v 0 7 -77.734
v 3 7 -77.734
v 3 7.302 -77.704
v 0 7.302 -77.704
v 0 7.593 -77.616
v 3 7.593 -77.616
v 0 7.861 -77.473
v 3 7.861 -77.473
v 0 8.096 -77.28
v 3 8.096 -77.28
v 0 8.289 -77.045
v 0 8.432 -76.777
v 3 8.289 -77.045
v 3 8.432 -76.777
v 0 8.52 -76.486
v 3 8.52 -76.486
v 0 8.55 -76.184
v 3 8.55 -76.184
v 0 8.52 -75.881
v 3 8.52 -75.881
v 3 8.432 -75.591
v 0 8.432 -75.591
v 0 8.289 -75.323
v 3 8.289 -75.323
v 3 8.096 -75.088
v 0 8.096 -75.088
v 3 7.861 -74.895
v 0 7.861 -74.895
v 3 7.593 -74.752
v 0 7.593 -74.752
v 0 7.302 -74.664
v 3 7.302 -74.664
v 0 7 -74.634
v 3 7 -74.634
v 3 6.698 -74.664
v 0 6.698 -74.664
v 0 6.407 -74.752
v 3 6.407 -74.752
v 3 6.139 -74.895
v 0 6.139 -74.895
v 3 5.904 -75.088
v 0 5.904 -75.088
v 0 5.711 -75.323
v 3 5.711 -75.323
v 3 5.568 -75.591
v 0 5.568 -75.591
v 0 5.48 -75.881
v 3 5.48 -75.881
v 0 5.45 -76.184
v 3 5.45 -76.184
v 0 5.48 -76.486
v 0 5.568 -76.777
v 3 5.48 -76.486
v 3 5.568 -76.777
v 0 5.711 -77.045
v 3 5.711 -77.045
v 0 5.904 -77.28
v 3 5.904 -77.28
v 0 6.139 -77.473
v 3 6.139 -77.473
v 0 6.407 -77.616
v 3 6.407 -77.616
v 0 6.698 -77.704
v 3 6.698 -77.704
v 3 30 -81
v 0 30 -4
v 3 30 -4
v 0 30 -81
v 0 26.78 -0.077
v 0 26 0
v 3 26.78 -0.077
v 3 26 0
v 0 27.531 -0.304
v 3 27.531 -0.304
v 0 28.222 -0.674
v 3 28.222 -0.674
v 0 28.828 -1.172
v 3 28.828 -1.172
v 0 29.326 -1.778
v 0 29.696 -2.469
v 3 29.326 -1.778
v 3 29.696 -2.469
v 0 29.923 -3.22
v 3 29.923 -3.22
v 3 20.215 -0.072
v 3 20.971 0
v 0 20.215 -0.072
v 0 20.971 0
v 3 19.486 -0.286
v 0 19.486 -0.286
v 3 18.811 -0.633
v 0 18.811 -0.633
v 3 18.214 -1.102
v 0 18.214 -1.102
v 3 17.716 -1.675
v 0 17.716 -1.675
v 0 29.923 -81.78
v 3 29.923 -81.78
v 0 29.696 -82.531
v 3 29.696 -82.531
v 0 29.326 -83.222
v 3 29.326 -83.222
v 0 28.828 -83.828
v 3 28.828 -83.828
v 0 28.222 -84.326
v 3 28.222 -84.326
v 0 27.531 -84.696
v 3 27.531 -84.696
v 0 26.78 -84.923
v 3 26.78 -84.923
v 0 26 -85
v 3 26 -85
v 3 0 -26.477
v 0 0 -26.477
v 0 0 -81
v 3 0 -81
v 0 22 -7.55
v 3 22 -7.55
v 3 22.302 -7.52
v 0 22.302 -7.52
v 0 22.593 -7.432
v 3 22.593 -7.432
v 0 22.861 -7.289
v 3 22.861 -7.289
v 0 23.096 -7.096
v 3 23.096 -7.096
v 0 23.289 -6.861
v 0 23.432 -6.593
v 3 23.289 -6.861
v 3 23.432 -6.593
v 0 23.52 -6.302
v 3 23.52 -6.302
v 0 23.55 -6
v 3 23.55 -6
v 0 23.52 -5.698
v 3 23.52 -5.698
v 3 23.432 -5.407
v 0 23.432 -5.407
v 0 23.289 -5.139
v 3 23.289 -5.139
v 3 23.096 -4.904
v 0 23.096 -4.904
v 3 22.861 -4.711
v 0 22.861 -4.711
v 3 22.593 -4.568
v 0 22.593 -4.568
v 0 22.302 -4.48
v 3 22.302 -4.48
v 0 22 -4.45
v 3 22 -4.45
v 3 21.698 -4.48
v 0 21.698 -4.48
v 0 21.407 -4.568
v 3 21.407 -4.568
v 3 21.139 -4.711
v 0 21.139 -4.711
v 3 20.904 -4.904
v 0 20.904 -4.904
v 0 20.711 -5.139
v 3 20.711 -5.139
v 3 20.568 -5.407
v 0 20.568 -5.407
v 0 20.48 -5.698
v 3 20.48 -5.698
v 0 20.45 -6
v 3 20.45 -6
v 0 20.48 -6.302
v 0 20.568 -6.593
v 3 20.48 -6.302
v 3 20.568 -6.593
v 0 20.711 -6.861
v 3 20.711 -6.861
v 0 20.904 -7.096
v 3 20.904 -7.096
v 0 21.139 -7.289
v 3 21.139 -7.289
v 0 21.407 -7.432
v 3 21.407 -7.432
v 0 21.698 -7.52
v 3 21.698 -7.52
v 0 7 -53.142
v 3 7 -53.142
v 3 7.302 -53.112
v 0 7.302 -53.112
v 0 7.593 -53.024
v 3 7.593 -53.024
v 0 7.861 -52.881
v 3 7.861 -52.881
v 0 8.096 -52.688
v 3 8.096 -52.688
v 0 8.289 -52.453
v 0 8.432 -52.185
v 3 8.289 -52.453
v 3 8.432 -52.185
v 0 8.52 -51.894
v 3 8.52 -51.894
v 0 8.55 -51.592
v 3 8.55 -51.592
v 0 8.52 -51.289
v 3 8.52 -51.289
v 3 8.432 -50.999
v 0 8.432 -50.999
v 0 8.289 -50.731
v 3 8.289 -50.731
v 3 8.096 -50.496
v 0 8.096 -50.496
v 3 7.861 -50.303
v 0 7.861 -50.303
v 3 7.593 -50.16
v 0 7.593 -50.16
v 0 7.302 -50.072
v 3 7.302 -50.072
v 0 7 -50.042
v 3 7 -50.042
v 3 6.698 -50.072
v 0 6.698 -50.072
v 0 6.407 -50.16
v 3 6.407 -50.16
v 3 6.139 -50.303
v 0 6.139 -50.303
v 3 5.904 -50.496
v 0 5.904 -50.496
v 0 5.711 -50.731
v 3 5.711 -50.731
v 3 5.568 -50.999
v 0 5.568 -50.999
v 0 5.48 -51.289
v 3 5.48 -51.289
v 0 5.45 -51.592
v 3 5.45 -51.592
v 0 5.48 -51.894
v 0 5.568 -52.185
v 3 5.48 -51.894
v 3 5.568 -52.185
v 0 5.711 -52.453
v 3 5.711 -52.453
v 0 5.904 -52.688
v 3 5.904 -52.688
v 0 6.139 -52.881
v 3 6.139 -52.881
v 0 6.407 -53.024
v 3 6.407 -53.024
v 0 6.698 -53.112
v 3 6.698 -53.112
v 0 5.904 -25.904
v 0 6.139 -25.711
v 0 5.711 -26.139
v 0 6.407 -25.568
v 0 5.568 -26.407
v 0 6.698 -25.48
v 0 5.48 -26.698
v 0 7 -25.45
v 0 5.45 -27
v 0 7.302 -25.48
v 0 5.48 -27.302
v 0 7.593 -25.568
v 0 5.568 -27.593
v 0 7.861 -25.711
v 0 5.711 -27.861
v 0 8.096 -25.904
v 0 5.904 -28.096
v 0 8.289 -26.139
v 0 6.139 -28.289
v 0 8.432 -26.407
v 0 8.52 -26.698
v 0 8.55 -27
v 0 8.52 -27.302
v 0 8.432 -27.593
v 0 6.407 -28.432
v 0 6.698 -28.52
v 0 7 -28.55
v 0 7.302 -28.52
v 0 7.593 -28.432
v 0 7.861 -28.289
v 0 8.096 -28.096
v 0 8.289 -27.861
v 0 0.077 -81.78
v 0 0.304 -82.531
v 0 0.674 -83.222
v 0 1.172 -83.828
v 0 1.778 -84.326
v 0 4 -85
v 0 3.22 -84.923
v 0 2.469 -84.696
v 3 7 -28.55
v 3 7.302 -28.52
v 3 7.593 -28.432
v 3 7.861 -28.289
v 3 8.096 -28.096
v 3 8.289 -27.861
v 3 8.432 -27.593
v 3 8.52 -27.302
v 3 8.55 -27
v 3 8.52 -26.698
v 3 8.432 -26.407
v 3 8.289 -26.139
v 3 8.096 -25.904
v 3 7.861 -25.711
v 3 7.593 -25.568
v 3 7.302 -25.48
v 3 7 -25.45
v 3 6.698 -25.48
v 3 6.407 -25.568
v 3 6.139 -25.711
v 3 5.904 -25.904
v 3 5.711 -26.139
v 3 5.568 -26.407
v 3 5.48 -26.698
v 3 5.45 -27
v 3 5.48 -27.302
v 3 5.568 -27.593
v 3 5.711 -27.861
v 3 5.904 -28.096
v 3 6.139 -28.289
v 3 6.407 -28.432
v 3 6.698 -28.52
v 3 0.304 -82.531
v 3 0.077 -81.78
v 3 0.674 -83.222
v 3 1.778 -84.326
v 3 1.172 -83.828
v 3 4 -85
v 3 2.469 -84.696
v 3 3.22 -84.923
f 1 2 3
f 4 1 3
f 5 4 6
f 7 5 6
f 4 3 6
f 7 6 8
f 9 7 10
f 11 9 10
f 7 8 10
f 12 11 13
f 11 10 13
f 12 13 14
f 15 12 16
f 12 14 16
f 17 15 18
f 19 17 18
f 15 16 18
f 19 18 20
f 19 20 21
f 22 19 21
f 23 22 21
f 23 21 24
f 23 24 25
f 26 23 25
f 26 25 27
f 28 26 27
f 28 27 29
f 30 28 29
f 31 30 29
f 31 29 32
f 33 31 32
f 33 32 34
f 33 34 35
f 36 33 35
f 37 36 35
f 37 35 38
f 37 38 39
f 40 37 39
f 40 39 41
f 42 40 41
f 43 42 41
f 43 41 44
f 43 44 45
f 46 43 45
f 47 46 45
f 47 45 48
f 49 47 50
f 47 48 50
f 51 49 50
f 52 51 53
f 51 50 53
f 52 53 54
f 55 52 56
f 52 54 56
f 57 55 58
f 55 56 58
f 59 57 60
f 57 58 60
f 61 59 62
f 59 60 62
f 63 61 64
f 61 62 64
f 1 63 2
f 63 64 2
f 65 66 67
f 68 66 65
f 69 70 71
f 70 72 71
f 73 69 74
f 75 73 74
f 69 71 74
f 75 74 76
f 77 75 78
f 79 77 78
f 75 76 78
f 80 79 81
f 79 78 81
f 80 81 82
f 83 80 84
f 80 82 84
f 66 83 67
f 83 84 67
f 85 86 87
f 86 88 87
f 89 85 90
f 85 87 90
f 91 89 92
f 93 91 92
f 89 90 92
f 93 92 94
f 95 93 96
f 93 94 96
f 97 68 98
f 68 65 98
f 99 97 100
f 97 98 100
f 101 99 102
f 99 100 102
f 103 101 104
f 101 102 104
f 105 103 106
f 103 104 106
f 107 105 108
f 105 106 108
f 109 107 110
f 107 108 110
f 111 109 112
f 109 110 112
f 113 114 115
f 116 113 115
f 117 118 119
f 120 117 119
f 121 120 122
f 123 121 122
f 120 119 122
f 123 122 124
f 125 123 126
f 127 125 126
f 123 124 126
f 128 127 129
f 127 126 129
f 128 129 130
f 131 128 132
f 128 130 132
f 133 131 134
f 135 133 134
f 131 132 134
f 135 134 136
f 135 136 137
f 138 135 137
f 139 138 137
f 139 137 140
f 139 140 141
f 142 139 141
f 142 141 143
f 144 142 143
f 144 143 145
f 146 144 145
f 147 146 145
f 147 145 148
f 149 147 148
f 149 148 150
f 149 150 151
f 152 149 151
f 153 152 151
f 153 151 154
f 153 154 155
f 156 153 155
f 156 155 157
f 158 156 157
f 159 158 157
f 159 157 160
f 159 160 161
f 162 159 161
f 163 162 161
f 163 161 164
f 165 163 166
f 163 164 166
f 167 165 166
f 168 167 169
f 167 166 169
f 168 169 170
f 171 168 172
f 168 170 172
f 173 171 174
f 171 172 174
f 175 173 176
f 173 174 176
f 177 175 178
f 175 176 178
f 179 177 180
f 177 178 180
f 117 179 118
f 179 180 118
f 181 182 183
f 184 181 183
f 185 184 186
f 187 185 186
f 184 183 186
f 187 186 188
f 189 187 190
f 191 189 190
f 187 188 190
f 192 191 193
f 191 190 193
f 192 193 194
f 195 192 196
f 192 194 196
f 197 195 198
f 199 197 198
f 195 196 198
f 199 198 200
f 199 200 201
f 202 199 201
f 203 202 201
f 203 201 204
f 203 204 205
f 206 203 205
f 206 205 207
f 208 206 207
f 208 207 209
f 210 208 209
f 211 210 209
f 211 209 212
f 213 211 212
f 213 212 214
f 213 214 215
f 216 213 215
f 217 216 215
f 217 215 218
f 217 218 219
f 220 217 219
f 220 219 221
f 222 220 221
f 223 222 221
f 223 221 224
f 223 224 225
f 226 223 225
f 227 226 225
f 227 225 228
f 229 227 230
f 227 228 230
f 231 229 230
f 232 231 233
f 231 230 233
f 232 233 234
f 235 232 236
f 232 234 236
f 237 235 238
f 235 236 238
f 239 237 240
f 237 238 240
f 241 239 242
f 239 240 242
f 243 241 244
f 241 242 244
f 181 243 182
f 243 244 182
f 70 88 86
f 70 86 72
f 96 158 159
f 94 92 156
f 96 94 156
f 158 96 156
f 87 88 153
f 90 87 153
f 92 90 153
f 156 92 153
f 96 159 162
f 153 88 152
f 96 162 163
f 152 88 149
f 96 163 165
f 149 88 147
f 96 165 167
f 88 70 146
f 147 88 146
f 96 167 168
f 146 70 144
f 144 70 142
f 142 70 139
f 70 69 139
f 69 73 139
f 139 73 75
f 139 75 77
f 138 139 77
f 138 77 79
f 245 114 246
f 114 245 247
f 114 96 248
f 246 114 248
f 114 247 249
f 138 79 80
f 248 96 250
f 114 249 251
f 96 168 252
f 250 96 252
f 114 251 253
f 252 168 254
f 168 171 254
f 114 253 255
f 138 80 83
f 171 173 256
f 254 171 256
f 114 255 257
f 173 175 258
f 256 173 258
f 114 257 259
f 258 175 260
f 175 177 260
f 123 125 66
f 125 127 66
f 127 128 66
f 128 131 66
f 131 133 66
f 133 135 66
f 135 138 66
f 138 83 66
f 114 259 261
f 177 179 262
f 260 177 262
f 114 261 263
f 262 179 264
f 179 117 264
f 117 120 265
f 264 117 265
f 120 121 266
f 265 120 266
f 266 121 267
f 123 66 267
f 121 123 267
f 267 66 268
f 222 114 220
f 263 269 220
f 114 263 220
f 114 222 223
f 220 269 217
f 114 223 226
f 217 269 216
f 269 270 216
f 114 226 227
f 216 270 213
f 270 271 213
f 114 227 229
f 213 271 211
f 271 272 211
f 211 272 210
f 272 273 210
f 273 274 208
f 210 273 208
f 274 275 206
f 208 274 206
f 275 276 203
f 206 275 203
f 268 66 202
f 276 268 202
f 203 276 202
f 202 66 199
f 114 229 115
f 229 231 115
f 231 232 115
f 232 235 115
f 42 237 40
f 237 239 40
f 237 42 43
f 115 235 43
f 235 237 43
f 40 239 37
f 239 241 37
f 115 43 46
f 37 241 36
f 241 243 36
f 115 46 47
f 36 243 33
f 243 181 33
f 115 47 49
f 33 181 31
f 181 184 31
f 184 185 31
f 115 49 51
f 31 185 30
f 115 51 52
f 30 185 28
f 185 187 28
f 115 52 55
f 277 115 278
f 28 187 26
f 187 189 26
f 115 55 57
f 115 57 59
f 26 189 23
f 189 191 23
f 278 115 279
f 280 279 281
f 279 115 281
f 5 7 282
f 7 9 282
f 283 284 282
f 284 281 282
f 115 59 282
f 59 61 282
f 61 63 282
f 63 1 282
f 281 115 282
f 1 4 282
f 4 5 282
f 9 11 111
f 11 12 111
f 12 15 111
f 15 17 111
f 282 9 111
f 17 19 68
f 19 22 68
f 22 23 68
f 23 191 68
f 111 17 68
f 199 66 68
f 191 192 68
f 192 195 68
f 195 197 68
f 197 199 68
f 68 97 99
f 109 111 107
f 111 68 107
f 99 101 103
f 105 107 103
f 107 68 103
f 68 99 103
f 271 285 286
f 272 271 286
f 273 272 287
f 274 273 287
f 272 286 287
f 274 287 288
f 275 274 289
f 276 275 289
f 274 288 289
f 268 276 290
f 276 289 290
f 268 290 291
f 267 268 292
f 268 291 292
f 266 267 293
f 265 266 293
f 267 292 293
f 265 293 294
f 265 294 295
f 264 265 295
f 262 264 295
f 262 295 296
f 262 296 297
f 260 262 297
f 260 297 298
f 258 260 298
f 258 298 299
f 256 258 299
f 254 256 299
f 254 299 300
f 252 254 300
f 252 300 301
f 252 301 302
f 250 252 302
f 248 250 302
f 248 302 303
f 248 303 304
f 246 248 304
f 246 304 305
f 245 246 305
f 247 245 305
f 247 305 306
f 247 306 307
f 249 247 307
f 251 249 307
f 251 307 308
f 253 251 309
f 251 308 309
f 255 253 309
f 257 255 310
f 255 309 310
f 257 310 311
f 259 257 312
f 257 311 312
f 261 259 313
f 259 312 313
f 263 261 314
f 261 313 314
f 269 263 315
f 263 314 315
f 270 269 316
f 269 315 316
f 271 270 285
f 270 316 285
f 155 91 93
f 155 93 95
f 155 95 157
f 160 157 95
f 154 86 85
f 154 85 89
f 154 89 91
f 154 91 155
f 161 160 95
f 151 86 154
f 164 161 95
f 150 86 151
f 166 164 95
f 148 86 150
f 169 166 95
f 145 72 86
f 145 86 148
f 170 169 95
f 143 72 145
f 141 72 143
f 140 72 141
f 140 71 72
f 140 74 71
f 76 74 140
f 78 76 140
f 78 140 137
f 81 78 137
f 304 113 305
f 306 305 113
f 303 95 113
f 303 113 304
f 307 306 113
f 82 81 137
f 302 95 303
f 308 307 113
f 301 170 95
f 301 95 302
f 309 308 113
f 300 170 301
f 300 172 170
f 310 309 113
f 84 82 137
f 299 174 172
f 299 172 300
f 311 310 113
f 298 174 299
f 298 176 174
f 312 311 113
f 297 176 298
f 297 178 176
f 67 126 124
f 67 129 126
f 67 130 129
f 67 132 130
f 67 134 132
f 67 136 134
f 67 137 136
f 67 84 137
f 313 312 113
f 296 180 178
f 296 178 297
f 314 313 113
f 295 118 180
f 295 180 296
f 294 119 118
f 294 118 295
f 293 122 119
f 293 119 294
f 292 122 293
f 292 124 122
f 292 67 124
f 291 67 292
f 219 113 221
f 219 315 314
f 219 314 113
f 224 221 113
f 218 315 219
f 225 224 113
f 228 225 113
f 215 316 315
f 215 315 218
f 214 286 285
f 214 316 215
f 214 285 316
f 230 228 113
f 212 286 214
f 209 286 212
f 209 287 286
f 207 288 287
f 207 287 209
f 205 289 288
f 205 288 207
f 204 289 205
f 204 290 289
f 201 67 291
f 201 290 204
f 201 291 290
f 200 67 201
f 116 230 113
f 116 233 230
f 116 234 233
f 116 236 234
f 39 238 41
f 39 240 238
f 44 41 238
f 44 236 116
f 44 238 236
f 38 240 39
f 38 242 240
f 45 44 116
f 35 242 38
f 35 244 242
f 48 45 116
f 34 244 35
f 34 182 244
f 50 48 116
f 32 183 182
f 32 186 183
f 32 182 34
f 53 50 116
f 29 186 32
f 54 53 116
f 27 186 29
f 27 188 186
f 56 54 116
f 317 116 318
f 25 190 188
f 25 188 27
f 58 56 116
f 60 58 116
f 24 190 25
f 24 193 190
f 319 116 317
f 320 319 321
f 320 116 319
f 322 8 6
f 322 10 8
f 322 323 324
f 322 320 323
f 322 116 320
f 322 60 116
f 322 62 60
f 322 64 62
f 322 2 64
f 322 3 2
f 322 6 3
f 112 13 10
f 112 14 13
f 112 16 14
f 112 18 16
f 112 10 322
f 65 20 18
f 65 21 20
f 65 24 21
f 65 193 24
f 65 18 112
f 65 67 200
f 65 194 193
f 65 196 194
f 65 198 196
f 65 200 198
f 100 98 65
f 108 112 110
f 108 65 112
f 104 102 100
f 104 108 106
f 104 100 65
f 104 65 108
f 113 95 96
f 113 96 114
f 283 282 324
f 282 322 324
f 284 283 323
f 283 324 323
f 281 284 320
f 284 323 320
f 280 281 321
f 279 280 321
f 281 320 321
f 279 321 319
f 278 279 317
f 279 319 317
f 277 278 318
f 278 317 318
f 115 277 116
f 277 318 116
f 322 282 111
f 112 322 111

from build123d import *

# Parameters (mm, degrees)
SKIZZE1_W                       = 85
SKIZZE1_H                       = 30
AUFSATZ_LINEAR_AUSTRAGEN1_DEPTH = 3
SKIZZE2_R                       = 1.55
SCHNITT_LINEAR_AUSTRAGEN1_DEPTH = 4
SCHNITT_LINEAR_AUSTRAGEN2_DEPTH = 4
VERRUNDUNG1_R                   = 4


with BuildPart() as part:
    # Skizze1 → Aufsatz-Linear austragen1 (new body)
    with BuildSketch(Plane(origin=(0, 0, 0), x_dir=(0, 0, -1), z_dir=(1, 0, 0))):
        with Locations((42.5, 15)):
            Rectangle(SKIZZE1_W, SKIZZE1_H)
    extrude(amount=AUFSATZ_LINEAR_AUSTRAGEN1_DEPTH)

    # Skizze2 → Schnitt-Linear austragen1 (cut, through all)
    with BuildSketch(Plane(origin=(3, 0, 0), x_dir=(0, 0, -1), z_dir=(1, 0, 0))):
        with Locations((6, 22)):
            Circle(SKIZZE2_R)
        with Locations((27, 7)):
            Circle(SKIZZE2_R)
        with Locations((51.59187467, 7)):
            Circle(SKIZZE2_R)
        with Locations((76.183749339, 7)):
            Circle(SKIZZE2_R)
    extrude(amount=-SCHNITT_LINEAR_AUSTRAGEN1_DEPTH, mode=Mode.SUBTRACT)

    # Skizze3 → Schnitt-Linear austragen2 (cut, through all)
    with BuildSketch(Plane(origin=(3, 0, 0), x_dir=(0, 0, -1), z_dir=(1, 0, 0))):
        Polygon((0, 18.912292628), (26.47720968, 0), (0, 0), align=None)
    extrude(amount=-SCHNITT_LINEAR_AUSTRAGEN2_DEPTH, mode=Mode.SUBTRACT)

    # Verrundung1
    verrundung1_edges = [part.edges().sort_by_distance(p)[0] for p in [
        (1.5, 18.912292628, 0),
        (1.5, 30, 0),
        (1.5, 30, -85),
        (1.5, 0, -85),
    ]]
    fillet(verrundung1_edges, radius=VERRUNDUNG1_R)


solid = part.part
